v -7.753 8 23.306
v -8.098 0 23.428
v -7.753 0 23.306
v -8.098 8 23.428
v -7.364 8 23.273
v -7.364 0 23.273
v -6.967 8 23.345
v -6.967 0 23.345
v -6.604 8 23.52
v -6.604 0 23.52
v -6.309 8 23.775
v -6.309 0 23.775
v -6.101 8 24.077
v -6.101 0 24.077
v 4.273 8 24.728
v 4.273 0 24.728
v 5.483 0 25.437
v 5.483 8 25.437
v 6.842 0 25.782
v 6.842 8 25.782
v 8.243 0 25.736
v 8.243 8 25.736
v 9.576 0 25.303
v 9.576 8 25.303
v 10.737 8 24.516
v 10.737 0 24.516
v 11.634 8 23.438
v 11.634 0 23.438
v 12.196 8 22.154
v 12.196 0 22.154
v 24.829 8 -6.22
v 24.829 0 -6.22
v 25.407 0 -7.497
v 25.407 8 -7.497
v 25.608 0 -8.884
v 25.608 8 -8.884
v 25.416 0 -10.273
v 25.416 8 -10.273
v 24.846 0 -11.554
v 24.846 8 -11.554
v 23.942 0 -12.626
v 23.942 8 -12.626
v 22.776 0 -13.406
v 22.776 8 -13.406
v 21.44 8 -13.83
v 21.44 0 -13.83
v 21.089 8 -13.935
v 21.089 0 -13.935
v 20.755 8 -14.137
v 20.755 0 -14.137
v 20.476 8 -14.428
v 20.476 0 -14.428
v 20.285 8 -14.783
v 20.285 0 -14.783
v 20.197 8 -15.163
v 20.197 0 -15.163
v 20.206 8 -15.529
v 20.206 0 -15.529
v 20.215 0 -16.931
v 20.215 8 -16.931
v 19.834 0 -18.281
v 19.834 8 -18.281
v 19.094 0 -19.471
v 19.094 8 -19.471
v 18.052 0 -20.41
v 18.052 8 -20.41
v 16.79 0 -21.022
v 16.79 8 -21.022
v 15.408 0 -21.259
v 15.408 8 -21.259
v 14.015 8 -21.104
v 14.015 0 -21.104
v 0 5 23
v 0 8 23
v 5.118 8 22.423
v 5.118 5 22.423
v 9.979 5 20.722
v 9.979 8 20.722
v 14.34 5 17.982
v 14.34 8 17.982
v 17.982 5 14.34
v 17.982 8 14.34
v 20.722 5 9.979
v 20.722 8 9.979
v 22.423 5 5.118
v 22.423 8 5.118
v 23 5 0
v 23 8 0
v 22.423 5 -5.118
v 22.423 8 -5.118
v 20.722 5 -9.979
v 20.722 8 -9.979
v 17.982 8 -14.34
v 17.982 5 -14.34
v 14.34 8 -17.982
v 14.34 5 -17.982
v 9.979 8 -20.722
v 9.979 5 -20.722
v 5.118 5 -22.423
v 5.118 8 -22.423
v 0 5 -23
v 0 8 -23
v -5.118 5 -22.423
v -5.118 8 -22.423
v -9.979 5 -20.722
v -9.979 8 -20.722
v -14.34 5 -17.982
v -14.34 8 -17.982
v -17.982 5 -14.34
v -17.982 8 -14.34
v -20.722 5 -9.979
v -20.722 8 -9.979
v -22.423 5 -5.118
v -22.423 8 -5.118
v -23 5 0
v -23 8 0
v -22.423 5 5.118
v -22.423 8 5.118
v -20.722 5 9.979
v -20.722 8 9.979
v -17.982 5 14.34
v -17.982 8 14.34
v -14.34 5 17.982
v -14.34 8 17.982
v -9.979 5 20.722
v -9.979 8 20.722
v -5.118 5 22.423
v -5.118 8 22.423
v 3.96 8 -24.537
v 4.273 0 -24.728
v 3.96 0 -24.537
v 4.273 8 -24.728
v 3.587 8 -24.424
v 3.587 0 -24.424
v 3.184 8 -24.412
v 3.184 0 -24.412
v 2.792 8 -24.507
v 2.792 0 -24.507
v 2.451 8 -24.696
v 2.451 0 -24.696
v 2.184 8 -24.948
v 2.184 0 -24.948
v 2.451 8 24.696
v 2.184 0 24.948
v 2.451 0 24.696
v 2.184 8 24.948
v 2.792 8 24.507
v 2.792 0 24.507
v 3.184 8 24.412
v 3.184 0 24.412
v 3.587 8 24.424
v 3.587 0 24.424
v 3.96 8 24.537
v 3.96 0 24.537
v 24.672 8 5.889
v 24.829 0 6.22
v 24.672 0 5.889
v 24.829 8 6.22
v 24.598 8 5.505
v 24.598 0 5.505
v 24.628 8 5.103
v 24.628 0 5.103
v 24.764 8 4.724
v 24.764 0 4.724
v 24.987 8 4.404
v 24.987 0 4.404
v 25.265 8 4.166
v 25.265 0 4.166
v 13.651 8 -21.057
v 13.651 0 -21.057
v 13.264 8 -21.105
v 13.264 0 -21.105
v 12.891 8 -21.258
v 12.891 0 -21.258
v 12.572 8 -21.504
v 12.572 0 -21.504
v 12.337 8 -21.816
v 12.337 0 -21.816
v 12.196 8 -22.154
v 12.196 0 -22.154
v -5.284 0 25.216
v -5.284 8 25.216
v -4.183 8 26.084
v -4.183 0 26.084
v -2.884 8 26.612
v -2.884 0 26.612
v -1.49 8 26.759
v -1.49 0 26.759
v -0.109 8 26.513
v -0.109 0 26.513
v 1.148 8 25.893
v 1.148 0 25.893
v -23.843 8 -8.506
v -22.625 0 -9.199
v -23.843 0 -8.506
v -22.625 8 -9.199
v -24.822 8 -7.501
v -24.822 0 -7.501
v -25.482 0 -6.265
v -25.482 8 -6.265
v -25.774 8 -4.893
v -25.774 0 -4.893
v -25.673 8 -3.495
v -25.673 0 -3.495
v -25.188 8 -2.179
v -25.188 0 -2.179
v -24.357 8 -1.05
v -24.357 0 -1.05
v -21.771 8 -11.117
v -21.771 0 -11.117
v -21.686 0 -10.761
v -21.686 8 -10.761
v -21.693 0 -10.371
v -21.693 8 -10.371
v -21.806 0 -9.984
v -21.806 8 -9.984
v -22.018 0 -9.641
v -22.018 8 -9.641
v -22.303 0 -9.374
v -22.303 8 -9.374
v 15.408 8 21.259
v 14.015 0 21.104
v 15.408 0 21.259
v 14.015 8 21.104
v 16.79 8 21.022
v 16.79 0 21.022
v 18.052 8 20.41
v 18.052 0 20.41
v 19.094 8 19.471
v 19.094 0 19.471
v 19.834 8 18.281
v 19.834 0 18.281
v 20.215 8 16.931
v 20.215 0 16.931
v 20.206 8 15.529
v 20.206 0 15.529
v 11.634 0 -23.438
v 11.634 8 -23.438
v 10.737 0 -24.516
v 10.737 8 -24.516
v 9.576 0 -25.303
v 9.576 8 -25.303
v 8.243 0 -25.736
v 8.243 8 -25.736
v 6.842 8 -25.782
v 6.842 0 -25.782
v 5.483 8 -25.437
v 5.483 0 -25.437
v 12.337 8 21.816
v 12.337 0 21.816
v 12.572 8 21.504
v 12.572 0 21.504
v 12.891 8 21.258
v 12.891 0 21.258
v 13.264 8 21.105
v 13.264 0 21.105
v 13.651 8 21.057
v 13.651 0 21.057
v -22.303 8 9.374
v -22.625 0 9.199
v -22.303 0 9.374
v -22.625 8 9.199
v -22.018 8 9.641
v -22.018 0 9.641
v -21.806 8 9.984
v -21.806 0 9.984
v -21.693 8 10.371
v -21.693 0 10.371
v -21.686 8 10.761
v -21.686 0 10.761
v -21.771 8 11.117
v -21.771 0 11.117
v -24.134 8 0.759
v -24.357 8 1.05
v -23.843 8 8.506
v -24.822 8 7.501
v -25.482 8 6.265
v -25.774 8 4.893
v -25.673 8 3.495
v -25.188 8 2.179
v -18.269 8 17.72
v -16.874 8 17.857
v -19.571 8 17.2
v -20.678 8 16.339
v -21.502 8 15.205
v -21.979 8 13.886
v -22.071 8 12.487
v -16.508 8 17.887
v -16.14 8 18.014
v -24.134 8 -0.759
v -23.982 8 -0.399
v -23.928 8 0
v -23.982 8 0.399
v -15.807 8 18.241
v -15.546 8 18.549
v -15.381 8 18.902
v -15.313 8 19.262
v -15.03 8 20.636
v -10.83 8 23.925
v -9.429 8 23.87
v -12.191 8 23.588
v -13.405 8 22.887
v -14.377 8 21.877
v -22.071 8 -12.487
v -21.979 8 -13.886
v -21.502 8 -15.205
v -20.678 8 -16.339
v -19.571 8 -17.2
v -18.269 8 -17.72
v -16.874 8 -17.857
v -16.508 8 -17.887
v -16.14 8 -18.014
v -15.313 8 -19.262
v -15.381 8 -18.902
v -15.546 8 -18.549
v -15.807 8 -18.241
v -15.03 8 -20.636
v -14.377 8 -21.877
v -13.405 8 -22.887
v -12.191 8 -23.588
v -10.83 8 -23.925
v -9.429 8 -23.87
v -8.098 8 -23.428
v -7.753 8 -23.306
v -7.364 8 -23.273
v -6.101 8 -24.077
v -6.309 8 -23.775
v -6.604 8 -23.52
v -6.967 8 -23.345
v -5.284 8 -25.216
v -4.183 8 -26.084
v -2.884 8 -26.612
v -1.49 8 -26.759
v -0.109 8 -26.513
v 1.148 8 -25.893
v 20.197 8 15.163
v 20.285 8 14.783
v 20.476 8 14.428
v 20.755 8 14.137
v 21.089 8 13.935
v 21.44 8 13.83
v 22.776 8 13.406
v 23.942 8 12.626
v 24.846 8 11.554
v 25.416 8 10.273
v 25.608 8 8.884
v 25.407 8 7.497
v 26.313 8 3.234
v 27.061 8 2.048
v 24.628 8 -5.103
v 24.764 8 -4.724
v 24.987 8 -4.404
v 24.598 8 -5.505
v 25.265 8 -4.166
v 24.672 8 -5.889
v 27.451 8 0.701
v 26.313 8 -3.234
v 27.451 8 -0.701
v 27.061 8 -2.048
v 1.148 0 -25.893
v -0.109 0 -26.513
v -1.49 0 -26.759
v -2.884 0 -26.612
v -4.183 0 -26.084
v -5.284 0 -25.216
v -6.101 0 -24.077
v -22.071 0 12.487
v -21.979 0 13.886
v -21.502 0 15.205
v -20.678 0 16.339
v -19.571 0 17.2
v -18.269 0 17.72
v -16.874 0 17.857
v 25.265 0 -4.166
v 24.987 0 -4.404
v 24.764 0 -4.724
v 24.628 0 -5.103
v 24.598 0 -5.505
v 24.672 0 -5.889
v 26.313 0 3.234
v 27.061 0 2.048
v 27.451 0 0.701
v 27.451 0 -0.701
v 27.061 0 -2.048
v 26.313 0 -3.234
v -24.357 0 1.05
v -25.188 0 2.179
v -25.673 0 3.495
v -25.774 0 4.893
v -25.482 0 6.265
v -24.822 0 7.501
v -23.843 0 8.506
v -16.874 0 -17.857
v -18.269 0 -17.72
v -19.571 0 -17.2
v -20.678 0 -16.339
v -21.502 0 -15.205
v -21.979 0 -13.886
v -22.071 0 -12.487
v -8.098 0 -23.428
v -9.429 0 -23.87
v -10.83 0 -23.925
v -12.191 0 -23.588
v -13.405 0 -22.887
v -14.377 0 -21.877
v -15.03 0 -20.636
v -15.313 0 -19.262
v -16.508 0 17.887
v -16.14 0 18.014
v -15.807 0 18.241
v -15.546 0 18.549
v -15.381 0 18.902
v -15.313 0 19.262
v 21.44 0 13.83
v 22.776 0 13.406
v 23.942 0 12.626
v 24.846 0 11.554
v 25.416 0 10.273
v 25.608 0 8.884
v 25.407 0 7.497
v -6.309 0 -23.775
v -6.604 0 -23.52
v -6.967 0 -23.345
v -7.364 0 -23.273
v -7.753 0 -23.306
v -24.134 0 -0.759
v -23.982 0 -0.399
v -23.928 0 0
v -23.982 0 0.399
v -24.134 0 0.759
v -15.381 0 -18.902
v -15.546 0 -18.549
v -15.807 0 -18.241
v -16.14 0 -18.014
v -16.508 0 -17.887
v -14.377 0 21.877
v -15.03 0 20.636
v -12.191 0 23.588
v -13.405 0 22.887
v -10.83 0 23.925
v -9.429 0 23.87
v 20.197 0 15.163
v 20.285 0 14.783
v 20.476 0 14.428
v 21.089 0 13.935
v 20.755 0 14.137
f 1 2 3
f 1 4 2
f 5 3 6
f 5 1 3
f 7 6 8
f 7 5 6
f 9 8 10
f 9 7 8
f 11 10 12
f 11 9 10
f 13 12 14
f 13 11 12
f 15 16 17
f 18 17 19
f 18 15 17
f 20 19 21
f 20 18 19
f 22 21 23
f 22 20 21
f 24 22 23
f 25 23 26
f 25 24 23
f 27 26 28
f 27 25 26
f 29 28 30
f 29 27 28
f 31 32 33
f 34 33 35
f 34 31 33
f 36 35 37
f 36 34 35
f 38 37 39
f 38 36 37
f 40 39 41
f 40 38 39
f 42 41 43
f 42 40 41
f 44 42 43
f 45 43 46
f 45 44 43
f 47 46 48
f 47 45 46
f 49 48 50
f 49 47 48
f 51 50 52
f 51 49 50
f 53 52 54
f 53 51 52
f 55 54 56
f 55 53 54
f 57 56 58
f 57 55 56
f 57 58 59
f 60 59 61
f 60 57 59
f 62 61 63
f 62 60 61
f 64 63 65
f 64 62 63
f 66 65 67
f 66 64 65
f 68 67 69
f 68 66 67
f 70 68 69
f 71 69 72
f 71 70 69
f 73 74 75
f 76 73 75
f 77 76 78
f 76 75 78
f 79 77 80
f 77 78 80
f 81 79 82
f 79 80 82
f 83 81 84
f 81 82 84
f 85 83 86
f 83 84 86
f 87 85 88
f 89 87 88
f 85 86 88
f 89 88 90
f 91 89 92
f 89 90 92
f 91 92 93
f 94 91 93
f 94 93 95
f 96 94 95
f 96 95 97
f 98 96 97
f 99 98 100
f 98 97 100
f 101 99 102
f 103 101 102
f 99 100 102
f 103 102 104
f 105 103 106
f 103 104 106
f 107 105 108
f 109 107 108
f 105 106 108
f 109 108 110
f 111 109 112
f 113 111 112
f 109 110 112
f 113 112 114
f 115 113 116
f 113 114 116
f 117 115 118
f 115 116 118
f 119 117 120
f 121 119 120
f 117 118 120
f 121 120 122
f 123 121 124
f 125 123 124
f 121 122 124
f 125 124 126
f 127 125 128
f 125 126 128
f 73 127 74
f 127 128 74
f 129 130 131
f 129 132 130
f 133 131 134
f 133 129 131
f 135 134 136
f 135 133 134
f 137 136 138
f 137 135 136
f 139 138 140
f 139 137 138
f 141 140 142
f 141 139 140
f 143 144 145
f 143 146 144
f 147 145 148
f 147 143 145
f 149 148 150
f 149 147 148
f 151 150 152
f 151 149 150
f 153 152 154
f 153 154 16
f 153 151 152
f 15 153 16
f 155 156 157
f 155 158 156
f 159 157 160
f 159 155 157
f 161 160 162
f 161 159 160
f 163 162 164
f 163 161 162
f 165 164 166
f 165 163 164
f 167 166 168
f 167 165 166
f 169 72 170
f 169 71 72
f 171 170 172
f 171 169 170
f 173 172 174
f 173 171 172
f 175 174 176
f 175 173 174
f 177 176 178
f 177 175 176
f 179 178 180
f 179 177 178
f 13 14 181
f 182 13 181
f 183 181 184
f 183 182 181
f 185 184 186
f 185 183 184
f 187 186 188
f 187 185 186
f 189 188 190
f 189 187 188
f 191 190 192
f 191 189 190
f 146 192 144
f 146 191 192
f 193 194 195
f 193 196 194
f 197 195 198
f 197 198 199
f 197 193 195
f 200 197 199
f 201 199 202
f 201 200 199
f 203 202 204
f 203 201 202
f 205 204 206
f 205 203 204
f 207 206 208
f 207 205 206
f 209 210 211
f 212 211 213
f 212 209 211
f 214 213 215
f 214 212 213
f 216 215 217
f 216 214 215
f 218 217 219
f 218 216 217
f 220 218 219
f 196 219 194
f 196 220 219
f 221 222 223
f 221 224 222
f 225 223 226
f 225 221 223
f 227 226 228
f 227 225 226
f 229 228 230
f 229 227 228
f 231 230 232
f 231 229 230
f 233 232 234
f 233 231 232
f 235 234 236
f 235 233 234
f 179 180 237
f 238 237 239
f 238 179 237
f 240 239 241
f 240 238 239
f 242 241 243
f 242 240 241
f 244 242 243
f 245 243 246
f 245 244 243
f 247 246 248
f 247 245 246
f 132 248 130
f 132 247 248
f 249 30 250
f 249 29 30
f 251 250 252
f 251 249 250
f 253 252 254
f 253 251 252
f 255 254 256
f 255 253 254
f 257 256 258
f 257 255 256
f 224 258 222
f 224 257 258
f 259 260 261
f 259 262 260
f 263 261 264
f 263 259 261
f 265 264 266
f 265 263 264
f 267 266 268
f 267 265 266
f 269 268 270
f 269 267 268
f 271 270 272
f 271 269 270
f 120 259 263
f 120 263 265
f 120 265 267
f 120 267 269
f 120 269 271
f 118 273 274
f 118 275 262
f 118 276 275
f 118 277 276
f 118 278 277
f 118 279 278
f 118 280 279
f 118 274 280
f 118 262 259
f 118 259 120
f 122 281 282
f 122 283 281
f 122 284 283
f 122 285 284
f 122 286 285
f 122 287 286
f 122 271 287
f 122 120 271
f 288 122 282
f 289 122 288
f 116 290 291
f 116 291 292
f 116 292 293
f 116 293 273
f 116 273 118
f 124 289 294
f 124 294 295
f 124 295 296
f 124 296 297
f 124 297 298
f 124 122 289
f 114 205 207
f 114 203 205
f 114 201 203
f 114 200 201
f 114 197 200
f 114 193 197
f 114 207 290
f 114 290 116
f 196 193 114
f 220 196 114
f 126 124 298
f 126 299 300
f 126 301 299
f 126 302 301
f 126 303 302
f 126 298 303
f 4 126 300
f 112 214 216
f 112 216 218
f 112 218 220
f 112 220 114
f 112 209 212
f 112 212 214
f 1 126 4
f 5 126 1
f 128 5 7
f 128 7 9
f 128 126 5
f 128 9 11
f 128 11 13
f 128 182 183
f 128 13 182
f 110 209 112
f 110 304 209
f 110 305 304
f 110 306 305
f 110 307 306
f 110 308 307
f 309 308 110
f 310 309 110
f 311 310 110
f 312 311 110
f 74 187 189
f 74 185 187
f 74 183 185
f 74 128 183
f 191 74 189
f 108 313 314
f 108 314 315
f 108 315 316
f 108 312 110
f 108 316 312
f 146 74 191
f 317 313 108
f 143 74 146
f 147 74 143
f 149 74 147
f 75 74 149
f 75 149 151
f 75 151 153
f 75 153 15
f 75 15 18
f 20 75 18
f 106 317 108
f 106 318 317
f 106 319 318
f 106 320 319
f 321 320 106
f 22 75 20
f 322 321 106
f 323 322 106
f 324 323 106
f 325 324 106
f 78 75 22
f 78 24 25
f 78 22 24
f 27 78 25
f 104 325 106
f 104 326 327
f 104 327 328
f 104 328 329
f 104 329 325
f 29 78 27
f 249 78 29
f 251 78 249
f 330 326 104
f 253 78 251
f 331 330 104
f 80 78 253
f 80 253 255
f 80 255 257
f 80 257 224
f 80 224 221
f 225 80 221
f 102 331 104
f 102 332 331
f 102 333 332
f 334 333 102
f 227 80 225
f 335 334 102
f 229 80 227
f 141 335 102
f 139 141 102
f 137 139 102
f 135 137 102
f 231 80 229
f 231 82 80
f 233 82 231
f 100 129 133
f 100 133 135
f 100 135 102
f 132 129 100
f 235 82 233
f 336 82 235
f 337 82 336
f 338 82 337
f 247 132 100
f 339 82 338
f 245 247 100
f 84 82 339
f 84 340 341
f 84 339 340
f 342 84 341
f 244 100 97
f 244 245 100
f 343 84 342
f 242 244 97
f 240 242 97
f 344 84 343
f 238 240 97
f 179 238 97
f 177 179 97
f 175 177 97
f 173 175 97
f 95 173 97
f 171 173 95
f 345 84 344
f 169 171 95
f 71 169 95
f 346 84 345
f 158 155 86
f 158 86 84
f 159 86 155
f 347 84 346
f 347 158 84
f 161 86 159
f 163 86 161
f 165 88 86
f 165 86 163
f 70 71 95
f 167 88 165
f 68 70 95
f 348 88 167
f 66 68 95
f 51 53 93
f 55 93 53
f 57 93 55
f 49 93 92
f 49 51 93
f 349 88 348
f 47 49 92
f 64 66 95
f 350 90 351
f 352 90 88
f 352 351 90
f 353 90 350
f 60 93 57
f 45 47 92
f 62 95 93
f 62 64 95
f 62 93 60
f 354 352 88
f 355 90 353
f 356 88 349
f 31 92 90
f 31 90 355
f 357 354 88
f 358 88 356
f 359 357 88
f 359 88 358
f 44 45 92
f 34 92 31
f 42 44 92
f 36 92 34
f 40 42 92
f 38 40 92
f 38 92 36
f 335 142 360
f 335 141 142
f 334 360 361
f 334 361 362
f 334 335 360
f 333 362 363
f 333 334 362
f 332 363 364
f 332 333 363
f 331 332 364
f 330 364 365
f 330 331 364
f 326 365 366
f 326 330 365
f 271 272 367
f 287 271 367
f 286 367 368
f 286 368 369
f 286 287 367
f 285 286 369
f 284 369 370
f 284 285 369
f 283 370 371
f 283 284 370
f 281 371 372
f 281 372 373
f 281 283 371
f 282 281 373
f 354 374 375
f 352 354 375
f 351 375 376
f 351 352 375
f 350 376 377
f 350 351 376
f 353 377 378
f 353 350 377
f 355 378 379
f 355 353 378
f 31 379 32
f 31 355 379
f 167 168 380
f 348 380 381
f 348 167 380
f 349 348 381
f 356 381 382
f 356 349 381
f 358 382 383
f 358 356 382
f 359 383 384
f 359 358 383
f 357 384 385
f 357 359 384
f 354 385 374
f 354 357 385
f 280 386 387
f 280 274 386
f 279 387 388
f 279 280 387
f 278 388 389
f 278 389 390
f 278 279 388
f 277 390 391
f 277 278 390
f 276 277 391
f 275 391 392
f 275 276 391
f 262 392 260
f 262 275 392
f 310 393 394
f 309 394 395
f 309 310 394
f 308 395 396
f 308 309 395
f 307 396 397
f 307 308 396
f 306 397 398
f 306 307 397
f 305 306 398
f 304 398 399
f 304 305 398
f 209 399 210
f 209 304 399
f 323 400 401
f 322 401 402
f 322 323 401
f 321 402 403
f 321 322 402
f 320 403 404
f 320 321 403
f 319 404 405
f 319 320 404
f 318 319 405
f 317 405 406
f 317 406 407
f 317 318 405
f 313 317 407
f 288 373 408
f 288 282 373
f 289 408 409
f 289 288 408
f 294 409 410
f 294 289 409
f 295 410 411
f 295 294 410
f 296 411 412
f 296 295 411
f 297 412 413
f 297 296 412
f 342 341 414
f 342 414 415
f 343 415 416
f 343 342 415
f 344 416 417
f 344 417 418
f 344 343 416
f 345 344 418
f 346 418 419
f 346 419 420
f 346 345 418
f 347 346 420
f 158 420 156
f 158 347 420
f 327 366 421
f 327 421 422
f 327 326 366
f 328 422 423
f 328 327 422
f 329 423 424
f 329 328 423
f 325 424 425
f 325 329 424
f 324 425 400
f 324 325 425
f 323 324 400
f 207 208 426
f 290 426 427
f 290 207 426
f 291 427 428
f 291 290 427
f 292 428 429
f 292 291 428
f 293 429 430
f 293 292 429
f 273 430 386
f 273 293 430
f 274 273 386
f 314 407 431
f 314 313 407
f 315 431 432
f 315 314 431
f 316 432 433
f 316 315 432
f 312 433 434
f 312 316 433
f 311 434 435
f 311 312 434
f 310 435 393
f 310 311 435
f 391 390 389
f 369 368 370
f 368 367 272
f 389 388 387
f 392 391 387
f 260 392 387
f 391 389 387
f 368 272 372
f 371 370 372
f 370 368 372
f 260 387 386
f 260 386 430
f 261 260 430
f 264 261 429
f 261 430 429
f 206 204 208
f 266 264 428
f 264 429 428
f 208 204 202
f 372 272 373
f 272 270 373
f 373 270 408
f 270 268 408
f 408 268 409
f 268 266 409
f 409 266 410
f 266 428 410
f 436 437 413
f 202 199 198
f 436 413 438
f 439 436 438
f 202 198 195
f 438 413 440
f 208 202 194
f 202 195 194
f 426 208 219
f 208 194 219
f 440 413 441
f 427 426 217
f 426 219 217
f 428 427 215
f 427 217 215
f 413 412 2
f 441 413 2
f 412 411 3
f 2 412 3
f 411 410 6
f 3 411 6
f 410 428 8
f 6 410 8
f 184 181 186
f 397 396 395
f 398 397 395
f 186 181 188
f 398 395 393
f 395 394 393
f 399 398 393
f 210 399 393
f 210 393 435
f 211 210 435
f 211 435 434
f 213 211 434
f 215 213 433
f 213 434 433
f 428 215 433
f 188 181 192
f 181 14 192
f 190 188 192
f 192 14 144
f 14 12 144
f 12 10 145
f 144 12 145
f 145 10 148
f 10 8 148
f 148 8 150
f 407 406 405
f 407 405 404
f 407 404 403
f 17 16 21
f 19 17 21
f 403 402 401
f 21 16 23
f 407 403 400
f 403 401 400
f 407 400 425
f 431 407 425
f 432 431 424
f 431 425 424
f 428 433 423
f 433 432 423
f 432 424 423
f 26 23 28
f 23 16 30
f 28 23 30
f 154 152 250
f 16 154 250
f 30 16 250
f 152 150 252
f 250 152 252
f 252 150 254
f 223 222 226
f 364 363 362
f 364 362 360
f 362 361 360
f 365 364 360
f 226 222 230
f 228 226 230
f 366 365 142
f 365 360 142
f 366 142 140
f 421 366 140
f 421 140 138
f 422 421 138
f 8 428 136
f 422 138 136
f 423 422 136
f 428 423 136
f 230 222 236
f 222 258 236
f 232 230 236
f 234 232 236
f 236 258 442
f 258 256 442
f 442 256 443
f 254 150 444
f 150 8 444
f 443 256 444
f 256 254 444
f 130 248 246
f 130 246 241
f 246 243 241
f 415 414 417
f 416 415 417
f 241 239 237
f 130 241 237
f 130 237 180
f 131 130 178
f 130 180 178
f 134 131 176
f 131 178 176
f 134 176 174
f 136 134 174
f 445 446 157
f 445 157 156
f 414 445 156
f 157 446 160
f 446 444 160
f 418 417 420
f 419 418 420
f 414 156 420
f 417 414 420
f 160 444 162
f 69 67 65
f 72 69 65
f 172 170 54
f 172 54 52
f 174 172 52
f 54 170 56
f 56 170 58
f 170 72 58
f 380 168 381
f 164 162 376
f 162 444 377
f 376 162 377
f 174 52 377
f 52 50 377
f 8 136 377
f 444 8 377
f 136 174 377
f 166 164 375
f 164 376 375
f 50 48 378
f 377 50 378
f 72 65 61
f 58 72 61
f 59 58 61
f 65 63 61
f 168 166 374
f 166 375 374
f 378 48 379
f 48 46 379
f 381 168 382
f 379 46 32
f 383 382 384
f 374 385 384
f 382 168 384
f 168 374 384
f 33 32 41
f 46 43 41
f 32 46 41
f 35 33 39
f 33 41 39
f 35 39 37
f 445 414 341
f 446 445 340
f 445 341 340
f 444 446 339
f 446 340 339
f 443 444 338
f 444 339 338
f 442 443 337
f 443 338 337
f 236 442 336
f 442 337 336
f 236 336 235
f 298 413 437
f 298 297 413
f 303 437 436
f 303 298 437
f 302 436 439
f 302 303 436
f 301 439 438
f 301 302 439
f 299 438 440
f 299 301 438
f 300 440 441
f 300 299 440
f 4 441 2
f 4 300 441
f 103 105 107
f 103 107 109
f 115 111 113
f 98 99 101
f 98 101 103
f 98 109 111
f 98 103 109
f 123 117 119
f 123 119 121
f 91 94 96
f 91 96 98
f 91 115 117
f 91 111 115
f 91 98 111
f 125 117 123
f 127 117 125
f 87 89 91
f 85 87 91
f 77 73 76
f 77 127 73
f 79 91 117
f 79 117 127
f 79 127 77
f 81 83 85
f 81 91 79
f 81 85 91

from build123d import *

# Parameters (mm, degrees)
SKETCH_1_R               = 22.5
EXTRUDE_1_DEPTH          = 8
SKETCH_3_R               = 5
EXTRUDE_3_DEPTH          = 8
PATTERN_CIRCULAR_1_COUNT = 15
FILLET_1_R               = 1.5
SKETCH_6_R               = 23
CUT_EXTRUDE_1_DEPTH      = 3


with BuildPart() as part:
    # 草图1 → 凸台-拉伸1 (new body)
    with BuildSketch(Plane(origin=(0, 0, 0), x_dir=(1, 0, 0), z_dir=(0, 1, 0))):
        with Locations(Location((0, 0, 0), (0, 0, 270))):
            Circle(SKETCH_1_R)
    extrude(amount=EXTRUDE_1_DEPTH)

    # 草图3 → 凸台-拉伸3 (add)
    with BuildSketch(Plane(origin=(0, 8, 0), x_dir=(1, 0, 0), z_dir=(0, 1, 0))):
        with Locations((22.5, 0)):
            Circle(SKETCH_3_R)
    extrude_3 = extrude(amount=-EXTRUDE_3_DEPTH)

    # 阵列(圆周)1: 凸台-拉伸3 ×15 about axis
    pattern_circular_1_axis = Axis((0.618008615, 0, 0), (0, 1, 0))
    for i in range(1, PATTERN_CIRCULAR_1_COUNT):
        add(extrude_3.rotate(pattern_circular_1_axis, i * 360 / PATTERN_CIRCULAR_1_COUNT))

    # 圆角1
    fillet_1_edges = [part.edges().sort_by_distance(p)[0] for p in [
        (23.58286781, 4, 4.88133151),
        (23.58286781, 4, -4.88133151),
        (19.612035026, 4, -13.799967965),
        (12.35696252, 4, -20.332464591),
        (3.072118239, 4, -23.349293374),
        (-6.637063891, 4, -22.328817212),
        (-15.091778074, 4, -17.447485702),
        (-20.83012742, 4, -9.549325409),
        (-22.859899195, 4, 0),
        (-20.83012742, 4, 9.549325409),
        (-15.091778074, 4, 17.447485702),
        (-6.637063891, 4, 22.328817212),
        (3.072118239, 4, 23.349293374),
        (12.35696252, 4, 20.332464591),
        (19.612035026, 4, 13.799967965),
    ]]
    fillet(fillet_1_edges, radius=FILLET_1_R)

    # 草图6 → 切除-拉伸1 (cut)
    with BuildSketch(Plane(origin=(0, 8, 0), x_dir=(1, 0, 0), z_dir=(0, 1, 0))):
        with Locations(Location((0, 0, 0), (0, 0, 270))):
            Circle(SKETCH_6_R)
    extrude(amount=-CUT_EXTRUDE_1_DEPTH, mode=Mode.SUBTRACT)


solid = part.part
